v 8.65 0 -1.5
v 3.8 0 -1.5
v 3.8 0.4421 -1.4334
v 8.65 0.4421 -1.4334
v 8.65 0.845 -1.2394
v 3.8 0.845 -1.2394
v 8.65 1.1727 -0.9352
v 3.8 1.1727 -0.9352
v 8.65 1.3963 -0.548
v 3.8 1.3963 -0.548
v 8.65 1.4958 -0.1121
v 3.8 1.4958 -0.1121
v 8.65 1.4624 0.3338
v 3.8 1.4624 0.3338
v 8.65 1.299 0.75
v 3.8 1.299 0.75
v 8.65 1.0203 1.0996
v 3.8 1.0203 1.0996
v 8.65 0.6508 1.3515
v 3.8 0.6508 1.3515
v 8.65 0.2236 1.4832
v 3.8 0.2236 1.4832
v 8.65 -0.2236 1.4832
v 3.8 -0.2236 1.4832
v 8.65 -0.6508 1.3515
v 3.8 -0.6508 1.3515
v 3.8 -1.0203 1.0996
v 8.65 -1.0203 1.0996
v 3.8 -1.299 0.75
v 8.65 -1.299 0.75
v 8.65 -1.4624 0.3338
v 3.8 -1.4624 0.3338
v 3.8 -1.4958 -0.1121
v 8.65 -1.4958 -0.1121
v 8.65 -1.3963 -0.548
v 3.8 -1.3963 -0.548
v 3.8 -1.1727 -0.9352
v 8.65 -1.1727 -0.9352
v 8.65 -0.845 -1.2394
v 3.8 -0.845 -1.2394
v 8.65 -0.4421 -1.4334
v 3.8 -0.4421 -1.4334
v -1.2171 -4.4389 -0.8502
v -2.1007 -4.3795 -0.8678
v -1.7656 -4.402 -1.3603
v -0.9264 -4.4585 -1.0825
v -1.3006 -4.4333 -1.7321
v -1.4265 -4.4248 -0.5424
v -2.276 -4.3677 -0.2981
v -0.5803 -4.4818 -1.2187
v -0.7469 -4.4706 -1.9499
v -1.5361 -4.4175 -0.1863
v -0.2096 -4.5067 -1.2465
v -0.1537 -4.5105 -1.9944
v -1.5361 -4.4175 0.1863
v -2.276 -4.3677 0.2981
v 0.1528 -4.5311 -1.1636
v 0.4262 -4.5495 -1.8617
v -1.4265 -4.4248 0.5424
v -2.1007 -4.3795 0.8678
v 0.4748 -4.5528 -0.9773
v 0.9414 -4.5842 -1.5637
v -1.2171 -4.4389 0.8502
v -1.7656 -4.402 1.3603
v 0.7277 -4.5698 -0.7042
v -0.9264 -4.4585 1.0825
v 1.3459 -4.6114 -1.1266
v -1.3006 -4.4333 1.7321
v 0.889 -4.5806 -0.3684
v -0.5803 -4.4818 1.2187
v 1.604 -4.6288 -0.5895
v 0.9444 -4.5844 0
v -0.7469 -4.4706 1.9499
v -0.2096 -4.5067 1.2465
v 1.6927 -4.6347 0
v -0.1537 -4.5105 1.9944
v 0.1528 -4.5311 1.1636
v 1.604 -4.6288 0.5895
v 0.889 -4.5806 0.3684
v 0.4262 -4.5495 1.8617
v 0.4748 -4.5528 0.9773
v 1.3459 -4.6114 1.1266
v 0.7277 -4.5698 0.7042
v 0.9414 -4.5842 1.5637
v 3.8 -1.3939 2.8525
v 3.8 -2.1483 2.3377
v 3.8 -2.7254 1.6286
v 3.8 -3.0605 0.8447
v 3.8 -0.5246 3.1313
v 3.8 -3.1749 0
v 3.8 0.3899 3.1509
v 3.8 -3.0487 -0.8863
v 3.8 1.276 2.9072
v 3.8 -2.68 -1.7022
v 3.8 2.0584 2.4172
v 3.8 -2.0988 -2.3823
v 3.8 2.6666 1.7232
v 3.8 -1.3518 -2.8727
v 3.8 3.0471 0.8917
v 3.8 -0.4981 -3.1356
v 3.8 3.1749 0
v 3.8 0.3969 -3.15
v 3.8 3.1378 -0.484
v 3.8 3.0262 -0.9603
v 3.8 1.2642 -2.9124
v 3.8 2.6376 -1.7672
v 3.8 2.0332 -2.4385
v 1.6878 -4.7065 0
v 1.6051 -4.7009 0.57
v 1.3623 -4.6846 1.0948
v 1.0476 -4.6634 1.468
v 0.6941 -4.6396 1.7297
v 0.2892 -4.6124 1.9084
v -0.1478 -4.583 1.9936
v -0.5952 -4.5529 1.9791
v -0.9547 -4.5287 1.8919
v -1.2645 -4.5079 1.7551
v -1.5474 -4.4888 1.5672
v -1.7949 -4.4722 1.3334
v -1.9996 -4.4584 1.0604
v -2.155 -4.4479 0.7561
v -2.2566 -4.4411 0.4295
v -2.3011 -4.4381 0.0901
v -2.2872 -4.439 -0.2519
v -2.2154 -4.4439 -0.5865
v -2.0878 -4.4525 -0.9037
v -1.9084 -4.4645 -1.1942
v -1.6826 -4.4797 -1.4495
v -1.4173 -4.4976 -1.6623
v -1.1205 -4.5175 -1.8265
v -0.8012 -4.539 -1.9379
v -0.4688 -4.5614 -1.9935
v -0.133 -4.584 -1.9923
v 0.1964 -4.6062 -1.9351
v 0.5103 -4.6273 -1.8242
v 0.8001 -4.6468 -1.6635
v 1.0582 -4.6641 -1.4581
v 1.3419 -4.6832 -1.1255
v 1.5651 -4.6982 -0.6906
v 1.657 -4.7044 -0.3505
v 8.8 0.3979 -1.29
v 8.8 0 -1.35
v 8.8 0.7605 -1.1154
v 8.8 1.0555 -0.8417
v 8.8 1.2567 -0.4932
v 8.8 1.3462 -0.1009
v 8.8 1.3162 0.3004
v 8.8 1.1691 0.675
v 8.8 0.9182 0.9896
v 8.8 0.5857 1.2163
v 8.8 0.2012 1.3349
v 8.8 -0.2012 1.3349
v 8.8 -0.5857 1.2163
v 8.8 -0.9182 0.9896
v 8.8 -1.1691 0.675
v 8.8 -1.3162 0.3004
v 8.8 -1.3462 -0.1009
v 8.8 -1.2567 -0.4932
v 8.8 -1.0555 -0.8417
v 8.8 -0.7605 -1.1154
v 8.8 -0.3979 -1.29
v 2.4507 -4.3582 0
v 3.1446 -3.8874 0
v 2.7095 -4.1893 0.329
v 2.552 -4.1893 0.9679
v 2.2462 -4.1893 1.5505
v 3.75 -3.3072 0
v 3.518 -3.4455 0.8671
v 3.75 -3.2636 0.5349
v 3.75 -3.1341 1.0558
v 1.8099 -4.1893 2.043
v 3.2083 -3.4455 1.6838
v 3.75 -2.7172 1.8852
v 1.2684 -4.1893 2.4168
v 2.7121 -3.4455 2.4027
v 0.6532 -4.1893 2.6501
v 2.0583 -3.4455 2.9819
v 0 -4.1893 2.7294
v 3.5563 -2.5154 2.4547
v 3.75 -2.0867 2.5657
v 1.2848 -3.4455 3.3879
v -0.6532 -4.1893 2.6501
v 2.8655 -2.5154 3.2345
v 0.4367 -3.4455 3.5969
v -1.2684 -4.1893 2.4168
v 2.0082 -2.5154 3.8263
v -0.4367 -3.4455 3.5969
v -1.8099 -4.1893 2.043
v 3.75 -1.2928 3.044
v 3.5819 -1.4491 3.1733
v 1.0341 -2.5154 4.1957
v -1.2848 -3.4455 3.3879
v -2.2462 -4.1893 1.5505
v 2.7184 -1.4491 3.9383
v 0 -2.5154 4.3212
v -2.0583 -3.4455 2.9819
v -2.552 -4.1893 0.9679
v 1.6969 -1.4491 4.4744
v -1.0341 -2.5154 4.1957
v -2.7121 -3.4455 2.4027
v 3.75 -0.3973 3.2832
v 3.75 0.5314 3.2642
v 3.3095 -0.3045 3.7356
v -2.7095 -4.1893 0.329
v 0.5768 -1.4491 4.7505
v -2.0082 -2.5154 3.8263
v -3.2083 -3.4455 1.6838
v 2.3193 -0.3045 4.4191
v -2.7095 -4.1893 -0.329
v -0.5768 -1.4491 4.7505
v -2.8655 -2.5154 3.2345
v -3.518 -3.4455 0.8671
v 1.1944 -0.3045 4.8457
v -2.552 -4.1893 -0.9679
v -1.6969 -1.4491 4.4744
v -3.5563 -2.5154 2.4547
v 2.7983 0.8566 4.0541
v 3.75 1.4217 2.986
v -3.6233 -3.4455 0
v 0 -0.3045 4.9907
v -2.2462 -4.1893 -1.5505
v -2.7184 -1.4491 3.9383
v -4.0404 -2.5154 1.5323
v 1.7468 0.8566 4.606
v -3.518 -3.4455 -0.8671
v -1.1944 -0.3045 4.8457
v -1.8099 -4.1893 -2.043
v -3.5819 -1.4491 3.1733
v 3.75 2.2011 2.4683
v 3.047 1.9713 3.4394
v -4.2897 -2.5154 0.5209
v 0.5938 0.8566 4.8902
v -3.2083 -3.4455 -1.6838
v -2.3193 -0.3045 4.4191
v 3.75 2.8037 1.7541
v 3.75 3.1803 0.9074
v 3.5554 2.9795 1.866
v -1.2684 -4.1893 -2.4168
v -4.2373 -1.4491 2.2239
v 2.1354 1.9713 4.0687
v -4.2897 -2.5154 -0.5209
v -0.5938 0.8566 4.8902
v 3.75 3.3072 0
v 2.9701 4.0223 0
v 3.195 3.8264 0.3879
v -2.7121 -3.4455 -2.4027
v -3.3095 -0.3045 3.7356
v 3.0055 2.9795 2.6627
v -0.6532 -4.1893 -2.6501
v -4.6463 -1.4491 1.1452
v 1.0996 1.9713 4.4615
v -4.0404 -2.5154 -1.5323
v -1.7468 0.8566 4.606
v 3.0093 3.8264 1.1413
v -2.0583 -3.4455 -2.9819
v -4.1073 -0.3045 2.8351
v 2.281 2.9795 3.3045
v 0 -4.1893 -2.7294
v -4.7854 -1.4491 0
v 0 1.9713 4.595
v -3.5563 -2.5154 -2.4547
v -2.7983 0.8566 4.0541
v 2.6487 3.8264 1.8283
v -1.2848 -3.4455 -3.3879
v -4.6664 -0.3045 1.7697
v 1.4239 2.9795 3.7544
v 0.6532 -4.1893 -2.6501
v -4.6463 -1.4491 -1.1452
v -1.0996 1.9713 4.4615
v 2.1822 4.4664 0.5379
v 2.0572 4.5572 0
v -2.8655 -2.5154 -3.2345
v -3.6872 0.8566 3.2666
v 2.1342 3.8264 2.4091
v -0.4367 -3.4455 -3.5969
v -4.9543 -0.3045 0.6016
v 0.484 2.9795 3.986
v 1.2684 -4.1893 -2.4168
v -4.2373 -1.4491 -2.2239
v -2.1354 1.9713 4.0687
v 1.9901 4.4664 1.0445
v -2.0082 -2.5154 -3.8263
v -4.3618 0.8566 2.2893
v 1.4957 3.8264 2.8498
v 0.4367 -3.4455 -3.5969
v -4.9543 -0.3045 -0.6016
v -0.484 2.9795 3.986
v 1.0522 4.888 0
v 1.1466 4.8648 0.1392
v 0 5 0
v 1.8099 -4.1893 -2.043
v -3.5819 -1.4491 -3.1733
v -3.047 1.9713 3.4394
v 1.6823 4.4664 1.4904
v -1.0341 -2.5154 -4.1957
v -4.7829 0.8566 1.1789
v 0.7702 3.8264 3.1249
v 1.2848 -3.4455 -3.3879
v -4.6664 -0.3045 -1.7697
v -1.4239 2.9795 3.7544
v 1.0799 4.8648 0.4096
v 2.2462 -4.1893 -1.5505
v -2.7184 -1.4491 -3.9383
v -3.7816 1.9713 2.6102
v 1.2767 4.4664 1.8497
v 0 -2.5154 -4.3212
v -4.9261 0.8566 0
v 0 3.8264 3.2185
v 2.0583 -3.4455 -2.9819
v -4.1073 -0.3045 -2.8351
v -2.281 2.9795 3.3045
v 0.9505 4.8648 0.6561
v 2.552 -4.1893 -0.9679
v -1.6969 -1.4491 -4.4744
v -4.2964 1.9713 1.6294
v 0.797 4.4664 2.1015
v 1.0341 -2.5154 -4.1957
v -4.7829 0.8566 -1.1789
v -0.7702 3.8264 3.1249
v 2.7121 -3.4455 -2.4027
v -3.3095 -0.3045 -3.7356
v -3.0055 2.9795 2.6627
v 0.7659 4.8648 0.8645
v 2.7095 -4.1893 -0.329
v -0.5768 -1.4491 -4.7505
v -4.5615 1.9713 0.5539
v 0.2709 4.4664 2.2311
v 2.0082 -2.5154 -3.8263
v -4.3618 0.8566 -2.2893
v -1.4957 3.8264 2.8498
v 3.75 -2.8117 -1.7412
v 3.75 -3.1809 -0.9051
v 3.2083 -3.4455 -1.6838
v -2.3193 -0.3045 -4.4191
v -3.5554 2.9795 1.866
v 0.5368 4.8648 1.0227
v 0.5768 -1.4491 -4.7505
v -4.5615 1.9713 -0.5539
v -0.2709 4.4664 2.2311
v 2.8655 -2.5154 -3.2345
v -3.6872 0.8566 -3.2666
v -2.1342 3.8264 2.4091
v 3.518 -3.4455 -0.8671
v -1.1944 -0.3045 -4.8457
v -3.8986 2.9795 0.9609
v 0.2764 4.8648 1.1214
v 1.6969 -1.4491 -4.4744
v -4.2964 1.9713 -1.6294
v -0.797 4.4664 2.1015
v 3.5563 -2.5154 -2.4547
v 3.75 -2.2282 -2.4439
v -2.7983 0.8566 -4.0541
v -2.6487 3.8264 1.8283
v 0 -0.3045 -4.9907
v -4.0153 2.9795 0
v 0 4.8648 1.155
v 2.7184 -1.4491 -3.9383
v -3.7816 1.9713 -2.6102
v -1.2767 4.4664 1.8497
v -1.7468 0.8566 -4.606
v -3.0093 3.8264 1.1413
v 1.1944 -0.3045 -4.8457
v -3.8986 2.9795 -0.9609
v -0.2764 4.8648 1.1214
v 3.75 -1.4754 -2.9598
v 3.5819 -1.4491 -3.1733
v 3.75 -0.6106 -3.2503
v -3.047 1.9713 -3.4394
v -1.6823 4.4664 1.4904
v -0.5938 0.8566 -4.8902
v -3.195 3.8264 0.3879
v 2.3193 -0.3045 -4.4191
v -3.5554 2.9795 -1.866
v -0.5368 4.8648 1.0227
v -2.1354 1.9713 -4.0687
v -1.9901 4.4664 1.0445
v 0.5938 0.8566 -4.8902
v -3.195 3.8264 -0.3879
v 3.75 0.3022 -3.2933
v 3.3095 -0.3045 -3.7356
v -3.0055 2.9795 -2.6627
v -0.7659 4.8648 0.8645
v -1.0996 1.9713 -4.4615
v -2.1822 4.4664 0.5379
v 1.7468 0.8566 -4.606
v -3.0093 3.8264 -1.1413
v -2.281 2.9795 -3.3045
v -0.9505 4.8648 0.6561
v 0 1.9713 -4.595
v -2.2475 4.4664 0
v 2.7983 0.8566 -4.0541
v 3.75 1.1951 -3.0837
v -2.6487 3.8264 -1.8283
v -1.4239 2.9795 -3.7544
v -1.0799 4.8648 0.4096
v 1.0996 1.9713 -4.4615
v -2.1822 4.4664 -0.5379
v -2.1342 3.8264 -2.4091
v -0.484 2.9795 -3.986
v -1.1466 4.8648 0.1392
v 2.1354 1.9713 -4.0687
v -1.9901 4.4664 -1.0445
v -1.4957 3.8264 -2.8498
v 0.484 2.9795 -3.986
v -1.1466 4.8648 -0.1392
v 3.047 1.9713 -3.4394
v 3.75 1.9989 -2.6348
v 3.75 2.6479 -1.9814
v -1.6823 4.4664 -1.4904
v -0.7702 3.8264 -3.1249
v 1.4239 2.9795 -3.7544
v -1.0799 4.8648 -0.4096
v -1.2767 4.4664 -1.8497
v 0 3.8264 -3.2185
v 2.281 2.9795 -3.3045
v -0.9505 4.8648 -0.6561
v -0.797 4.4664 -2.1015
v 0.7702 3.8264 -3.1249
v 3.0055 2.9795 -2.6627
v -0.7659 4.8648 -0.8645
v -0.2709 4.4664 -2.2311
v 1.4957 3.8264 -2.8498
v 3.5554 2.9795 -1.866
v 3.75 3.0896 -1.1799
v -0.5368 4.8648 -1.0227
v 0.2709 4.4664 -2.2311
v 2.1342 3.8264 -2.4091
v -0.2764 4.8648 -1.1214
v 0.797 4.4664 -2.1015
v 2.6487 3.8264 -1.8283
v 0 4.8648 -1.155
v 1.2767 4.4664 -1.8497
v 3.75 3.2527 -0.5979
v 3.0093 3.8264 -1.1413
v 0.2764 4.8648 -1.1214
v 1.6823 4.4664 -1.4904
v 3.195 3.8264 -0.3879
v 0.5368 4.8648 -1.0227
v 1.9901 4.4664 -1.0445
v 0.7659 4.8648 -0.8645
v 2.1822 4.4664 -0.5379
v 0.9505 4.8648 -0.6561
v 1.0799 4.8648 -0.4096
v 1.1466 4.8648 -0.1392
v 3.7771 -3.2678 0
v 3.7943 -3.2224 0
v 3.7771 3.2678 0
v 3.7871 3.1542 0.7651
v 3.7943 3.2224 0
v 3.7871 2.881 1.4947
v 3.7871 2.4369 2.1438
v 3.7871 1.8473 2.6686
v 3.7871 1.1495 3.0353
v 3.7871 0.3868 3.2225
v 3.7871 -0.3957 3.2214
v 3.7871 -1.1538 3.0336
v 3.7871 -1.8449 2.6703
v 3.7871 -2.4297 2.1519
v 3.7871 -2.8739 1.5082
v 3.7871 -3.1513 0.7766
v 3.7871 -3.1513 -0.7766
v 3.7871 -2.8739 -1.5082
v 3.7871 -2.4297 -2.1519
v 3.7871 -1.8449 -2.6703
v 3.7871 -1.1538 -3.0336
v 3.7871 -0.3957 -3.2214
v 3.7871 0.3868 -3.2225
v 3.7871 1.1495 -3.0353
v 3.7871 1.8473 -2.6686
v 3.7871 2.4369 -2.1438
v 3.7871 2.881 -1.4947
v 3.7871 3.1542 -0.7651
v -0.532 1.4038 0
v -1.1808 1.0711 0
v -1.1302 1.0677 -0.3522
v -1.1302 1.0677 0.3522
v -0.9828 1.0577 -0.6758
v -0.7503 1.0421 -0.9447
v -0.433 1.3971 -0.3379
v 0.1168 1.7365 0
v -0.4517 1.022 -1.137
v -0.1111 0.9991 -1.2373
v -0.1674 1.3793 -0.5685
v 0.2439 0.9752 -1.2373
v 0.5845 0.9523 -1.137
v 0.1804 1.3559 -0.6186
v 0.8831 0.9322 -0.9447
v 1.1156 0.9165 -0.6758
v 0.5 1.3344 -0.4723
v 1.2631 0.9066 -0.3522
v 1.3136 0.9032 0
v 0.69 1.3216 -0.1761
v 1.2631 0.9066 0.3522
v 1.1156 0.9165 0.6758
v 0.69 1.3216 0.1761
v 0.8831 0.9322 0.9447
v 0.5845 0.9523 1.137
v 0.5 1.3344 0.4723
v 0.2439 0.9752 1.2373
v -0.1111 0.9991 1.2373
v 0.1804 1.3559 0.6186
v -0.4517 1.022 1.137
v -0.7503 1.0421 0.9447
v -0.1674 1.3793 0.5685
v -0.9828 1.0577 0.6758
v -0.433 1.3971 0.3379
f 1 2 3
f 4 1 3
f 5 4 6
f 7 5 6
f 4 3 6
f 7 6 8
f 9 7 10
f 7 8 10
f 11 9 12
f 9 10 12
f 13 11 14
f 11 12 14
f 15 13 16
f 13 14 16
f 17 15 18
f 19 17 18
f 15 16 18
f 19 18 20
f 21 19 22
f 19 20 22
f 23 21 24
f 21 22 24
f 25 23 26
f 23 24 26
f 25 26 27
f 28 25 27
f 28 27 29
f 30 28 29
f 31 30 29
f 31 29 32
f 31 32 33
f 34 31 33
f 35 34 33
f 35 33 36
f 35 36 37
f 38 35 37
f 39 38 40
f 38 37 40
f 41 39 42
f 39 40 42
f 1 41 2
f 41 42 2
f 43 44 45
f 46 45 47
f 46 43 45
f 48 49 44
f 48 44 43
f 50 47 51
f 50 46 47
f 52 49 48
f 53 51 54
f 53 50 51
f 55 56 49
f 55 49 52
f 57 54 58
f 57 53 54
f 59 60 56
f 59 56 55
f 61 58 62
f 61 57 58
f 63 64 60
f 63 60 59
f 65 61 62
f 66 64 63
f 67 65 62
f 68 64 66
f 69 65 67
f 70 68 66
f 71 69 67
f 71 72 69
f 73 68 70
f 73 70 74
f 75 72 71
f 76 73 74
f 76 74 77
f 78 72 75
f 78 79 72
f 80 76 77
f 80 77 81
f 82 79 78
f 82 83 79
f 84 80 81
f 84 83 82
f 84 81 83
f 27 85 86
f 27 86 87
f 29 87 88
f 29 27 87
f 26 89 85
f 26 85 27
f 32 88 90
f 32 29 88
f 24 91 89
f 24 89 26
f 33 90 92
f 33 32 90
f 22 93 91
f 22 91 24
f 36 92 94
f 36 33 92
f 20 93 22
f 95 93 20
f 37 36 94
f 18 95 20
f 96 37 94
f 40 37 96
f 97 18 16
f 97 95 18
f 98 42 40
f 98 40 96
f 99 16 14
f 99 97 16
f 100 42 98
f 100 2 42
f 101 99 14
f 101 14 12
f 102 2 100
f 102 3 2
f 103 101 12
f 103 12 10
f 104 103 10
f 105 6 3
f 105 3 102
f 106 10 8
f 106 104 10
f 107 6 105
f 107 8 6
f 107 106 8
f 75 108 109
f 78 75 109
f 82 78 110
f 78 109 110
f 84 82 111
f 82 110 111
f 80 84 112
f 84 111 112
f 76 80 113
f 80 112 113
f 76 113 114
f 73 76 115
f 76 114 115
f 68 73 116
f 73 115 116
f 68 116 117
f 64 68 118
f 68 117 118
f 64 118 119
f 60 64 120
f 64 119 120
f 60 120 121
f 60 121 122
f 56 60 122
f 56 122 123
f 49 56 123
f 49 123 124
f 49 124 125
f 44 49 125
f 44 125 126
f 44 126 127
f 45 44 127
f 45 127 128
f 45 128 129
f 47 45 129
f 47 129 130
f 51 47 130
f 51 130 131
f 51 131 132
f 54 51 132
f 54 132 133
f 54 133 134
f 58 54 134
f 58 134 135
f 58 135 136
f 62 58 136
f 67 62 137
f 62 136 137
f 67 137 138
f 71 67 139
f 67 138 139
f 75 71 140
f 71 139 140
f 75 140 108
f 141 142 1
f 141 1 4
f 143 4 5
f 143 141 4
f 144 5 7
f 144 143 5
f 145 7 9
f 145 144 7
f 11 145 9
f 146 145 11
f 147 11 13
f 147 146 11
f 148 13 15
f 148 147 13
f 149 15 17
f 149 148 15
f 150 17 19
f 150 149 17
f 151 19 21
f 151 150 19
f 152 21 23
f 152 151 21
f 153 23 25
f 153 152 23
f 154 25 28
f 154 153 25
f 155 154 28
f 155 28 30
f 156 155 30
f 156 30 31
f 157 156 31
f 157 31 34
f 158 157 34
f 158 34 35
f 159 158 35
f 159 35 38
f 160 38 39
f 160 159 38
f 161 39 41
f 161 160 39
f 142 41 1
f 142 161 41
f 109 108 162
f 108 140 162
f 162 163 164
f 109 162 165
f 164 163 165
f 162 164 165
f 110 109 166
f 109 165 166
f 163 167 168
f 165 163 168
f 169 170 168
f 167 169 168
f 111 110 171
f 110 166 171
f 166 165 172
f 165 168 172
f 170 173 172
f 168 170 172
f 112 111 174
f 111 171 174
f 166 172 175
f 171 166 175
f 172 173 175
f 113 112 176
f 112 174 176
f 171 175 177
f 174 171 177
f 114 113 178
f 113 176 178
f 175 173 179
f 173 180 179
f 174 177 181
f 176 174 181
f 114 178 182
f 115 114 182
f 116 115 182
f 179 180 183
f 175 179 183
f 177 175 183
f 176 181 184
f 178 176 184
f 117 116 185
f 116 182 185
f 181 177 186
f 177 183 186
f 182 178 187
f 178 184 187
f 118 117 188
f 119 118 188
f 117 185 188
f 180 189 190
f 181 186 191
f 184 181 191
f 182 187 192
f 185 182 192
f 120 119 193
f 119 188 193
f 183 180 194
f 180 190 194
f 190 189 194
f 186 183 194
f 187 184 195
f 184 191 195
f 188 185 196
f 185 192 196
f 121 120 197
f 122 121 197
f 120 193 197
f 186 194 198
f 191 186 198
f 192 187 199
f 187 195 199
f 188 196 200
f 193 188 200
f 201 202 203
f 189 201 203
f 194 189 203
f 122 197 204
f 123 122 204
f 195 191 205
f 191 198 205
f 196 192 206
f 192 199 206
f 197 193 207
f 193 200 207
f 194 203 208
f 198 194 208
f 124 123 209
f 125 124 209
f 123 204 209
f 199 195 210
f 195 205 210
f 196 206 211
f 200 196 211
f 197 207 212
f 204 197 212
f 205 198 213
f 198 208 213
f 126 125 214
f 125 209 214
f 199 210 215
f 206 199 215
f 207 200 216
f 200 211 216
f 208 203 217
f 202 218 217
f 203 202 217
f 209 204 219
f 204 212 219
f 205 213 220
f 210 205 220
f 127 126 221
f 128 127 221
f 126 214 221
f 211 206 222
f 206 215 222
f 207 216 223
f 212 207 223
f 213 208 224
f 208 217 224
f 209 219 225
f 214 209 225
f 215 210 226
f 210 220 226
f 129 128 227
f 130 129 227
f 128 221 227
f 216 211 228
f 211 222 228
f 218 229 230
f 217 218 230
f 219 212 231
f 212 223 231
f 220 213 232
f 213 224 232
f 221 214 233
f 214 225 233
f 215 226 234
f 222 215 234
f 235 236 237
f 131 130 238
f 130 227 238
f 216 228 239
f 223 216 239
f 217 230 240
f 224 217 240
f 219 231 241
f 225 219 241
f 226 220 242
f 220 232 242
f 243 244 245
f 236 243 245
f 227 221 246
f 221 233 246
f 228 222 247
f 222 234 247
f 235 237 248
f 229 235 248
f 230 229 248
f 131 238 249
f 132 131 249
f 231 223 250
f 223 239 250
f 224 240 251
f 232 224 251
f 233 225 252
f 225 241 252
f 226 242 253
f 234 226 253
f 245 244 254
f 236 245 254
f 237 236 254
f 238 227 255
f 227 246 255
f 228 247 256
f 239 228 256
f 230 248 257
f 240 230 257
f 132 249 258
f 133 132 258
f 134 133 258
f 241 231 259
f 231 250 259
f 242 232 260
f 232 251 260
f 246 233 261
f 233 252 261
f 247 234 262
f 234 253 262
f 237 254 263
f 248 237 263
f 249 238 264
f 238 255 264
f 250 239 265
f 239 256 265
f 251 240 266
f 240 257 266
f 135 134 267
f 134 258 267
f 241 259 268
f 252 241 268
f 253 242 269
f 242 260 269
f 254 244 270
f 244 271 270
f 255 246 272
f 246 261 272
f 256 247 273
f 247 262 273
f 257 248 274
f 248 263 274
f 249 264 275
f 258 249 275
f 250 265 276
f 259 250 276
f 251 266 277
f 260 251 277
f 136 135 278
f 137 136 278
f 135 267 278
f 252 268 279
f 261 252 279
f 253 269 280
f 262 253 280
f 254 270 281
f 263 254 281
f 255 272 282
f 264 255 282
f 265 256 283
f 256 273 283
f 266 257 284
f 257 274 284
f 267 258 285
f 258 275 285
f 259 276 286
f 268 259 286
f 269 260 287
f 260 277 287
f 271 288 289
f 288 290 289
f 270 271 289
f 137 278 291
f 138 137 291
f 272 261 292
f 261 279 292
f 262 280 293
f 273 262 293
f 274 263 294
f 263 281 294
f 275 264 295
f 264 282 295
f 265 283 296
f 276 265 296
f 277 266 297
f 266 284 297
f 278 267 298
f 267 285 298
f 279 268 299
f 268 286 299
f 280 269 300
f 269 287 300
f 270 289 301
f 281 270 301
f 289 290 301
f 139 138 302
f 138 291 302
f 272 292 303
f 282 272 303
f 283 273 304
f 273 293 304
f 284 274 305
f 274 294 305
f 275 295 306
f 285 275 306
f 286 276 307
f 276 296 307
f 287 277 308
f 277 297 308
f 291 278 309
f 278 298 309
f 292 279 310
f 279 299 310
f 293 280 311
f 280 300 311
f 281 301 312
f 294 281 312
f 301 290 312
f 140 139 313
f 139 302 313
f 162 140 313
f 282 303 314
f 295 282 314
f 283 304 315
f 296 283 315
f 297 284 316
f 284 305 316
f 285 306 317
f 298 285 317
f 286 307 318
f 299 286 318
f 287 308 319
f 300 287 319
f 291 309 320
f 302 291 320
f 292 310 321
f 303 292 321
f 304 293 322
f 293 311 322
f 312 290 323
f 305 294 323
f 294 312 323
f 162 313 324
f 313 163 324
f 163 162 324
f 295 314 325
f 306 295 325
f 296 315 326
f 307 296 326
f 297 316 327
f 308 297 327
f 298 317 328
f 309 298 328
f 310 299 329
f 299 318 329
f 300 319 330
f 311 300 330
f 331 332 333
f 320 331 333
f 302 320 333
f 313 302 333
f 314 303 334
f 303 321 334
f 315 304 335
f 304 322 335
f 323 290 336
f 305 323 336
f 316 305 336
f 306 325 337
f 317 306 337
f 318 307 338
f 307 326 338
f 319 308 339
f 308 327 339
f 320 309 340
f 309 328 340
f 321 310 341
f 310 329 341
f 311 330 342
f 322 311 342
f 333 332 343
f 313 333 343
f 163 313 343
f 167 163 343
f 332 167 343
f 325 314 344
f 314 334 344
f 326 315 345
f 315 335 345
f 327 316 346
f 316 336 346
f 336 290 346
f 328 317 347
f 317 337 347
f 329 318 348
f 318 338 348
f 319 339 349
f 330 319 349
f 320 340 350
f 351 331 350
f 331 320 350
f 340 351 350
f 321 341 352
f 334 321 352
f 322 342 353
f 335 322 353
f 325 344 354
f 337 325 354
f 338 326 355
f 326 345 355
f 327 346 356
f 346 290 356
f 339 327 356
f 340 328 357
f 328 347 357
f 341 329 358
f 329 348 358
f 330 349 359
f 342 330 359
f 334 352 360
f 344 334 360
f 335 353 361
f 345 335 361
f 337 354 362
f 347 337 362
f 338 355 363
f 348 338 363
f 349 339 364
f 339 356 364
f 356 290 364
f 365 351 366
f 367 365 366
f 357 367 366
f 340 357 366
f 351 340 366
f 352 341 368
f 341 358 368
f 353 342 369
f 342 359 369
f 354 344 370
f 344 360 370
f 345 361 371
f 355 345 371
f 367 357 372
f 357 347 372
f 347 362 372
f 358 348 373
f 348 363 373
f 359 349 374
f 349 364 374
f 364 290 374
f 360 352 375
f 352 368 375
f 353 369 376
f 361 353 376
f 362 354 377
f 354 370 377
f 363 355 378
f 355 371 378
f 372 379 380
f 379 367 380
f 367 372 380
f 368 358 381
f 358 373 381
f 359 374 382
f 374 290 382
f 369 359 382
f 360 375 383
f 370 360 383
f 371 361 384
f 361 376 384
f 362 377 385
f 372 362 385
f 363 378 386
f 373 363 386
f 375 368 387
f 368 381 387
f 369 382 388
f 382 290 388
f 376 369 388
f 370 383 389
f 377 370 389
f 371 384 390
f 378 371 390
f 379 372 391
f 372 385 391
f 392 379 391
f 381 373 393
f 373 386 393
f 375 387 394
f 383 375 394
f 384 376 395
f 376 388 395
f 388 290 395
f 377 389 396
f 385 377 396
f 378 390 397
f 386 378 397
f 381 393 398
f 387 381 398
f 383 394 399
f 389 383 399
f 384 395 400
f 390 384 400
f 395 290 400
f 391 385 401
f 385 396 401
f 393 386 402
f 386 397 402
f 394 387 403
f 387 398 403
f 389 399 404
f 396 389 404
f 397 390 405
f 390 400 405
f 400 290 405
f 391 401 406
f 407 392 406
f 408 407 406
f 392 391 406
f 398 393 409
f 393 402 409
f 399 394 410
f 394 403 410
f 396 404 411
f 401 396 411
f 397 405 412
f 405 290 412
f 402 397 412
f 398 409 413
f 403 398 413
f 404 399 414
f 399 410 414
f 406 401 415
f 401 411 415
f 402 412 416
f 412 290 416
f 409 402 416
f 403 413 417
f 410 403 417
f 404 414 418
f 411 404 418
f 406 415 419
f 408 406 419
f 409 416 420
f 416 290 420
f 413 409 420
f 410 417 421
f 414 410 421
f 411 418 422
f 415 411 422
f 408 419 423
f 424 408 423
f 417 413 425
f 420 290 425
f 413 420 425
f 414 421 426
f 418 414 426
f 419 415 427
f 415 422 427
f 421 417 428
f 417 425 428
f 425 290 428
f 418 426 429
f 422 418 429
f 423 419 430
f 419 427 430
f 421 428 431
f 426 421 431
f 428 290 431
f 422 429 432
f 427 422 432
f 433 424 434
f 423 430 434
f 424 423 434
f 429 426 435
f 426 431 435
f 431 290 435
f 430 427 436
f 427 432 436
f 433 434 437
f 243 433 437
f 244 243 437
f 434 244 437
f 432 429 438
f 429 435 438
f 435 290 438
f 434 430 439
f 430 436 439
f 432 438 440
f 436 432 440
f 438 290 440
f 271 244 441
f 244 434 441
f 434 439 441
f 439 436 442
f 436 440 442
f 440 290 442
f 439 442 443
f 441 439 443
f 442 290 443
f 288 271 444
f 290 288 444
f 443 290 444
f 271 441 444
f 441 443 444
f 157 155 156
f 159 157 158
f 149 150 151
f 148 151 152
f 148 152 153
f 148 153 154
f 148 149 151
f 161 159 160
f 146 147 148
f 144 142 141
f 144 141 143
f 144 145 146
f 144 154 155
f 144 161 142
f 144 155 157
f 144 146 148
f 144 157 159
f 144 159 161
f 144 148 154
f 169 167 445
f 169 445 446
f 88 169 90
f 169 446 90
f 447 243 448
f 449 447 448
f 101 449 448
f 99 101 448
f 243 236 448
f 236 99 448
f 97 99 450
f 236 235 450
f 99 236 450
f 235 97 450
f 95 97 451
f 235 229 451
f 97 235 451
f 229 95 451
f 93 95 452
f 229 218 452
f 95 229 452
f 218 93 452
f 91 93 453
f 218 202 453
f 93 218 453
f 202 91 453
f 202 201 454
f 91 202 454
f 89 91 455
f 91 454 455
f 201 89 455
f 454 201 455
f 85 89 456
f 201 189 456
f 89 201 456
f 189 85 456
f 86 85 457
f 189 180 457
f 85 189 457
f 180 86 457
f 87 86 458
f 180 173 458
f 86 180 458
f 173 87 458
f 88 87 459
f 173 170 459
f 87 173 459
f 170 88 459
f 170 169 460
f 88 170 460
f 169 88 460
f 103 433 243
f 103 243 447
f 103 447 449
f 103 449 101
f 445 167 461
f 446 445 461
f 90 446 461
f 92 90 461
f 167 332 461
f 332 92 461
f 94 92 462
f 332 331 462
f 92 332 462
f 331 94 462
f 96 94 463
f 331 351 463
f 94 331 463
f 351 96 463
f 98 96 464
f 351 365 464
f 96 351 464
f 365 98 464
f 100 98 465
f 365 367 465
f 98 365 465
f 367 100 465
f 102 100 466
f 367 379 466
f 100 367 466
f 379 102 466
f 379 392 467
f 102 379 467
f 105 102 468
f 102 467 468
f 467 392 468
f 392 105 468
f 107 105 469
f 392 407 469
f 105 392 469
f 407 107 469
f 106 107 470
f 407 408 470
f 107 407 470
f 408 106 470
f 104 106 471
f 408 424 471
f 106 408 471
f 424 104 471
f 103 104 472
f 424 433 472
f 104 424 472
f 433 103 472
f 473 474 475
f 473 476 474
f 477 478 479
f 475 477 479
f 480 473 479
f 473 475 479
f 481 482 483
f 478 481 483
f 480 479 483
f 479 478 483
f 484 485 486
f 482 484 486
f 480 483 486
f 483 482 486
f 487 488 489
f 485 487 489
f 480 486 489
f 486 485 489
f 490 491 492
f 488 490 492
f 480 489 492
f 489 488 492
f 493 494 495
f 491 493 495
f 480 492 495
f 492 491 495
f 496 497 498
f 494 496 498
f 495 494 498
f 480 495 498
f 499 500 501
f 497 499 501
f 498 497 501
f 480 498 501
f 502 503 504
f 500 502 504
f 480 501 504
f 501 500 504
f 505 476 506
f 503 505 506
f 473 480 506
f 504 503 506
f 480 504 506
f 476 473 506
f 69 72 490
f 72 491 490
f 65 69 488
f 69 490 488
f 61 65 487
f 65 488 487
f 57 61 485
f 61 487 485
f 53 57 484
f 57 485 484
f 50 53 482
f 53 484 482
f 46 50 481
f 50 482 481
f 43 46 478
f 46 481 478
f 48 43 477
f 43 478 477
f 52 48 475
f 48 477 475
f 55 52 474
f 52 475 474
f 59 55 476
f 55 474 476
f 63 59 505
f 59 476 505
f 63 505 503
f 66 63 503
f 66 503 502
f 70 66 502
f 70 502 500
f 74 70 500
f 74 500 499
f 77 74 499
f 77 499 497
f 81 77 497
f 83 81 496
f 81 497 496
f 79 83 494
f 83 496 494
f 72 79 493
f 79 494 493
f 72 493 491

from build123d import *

# Parameters (mm, degrees)
SKETCH_6_R             = 2
CUT_EXTRUDE_1_DEPTH    = 0.2
SKETCH_6_2_R           = 2
CUT_EXTRUDE_2_DEPTH    = 5
HOLE_WIZARD_M3_1_D     = 2.5
HOLE_WIZARD_M3_1_DEPTH = 5.5
HOLE_WIZARD_M3_1_TIP   = 0.751075774
SKETCH_10_R            = 10.599002553
CUT_EXTRUDE_3_DEPTH    = 10
SKETCH_11_R            = 1.5
EXTRUDE_1_DEPTH        = 5
FILLET_1_R             = 0.2
CHAMFER_1_SIZE         = 0.15


with BuildPart() as part:
    # 草图1 → 旋转1 (revolve)
    with BuildSketch(Plane.XY):
        with BuildLine():
            Line((0, 5), (0, -5))
            ThreePointArc((0, -5), (5, 0), (0, 5))
        make_face()
    revolve(axis=Axis((0, 5, 0), (0, -1, 0)))

    # 草图6 → 切除-拉伸1 (cut)
    with BuildSketch(Plane(origin=(-0.316240488, -4.7, 0), x_dir=(0.9977440075226778, -0.06713341532044086, 0), z_dir=(-0.06713341532044086, -0.9977440075226779, 0))):
        Circle(SKETCH_6_R)
    extrude(amount=-CUT_EXTRUDE_1_DEPTH, mode=Mode.SUBTRACT)


with BuildPart() as cut_extrude_1_piece_1:
    # of the separate pieces the step leaves, piece 1, a body of its own (cut_extrude_1_pieces)
    add(part.part.solids().sort_by_distance((1.687844058, -4.706504269, 0))[0])

    # M3 螺纹孔1
    with Locations(Plane(origin=(-0.302813805, -4.500451198, 0), x_dir=(-0.997744007523, 0.06713341532, 0), z_dir=(-0.06713341532, -0.997744007523, 0))):
        with Locations((0, 0)):
            Hole(HOLE_WIZARD_M3_1_D / 2, depth=HOLE_WIZARD_M3_1_DEPTH)
            with Locations((0, 0, -(HOLE_WIZARD_M3_1_DEPTH + HOLE_WIZARD_M3_1_TIP / 2))):  # 118° drill point
                Cone(0, HOLE_WIZARD_M3_1_D / 2, HOLE_WIZARD_M3_1_TIP, mode=Mode.SUBTRACT)

    # 草图10 → 切除-拉伸3 (cut)
    with BuildSketch(Plane(origin=(3.8, 0, 0), x_dir=(0, 0, -1), z_dir=(1, 0, 0))):
        Circle(SKETCH_10_R)
    extrude(amount=CUT_EXTRUDE_3_DEPTH, mode=Mode.SUBTRACT)

    # 草图11 → 凸台-拉伸1 (add)
    with BuildSketch(Plane(origin=(3.8, 0, 0), x_dir=(0, 0, -1), z_dir=(1, 0, 0))):
        Circle(SKETCH_11_R)
    extrude(amount=EXTRUDE_1_DEPTH)

    # 圆角1
    fillet_1_edges = [cut_extrude_1_piece_1.edges().sort_by_distance(p)[0] for p in [
        (3.8, 0, -3.249615362),
    ]]
    fillet(fillet_1_edges, radius=FILLET_1_R)

    # 倒角1
    chamfer_1_edges = [cut_extrude_1_piece_1.edges().sort_by_distance(p)[0] for p in [
        (8.8, 0, 1.5),
    ]]
    chamfer(chamfer_1_edges, length=CHAMFER_1_SIZE)


with BuildPart() as cut_extrude_1_piece_2:
    # of the separate pieces the step leaves, piece 2, a body of its own (cut_extrude_1_pieces)
    add(part.part.solids().sort_by_distance((0, -5, 0))[0])

    # 草图6<2> → 切除-拉伸2 (cut)
    with BuildSketch(Plane(origin=(-0.316240488, -4.7, 0), x_dir=(0.9977440075226778, -0.06713341532044086, 0), z_dir=(-0.06713341532044086, -0.9977440075226779, 0))):
        Circle(SKETCH_6_2_R)
    extrude(amount=CUT_EXTRUDE_2_DEPTH, mode=Mode.SUBTRACT)


solid = cut_extrude_1_piece_1.part
